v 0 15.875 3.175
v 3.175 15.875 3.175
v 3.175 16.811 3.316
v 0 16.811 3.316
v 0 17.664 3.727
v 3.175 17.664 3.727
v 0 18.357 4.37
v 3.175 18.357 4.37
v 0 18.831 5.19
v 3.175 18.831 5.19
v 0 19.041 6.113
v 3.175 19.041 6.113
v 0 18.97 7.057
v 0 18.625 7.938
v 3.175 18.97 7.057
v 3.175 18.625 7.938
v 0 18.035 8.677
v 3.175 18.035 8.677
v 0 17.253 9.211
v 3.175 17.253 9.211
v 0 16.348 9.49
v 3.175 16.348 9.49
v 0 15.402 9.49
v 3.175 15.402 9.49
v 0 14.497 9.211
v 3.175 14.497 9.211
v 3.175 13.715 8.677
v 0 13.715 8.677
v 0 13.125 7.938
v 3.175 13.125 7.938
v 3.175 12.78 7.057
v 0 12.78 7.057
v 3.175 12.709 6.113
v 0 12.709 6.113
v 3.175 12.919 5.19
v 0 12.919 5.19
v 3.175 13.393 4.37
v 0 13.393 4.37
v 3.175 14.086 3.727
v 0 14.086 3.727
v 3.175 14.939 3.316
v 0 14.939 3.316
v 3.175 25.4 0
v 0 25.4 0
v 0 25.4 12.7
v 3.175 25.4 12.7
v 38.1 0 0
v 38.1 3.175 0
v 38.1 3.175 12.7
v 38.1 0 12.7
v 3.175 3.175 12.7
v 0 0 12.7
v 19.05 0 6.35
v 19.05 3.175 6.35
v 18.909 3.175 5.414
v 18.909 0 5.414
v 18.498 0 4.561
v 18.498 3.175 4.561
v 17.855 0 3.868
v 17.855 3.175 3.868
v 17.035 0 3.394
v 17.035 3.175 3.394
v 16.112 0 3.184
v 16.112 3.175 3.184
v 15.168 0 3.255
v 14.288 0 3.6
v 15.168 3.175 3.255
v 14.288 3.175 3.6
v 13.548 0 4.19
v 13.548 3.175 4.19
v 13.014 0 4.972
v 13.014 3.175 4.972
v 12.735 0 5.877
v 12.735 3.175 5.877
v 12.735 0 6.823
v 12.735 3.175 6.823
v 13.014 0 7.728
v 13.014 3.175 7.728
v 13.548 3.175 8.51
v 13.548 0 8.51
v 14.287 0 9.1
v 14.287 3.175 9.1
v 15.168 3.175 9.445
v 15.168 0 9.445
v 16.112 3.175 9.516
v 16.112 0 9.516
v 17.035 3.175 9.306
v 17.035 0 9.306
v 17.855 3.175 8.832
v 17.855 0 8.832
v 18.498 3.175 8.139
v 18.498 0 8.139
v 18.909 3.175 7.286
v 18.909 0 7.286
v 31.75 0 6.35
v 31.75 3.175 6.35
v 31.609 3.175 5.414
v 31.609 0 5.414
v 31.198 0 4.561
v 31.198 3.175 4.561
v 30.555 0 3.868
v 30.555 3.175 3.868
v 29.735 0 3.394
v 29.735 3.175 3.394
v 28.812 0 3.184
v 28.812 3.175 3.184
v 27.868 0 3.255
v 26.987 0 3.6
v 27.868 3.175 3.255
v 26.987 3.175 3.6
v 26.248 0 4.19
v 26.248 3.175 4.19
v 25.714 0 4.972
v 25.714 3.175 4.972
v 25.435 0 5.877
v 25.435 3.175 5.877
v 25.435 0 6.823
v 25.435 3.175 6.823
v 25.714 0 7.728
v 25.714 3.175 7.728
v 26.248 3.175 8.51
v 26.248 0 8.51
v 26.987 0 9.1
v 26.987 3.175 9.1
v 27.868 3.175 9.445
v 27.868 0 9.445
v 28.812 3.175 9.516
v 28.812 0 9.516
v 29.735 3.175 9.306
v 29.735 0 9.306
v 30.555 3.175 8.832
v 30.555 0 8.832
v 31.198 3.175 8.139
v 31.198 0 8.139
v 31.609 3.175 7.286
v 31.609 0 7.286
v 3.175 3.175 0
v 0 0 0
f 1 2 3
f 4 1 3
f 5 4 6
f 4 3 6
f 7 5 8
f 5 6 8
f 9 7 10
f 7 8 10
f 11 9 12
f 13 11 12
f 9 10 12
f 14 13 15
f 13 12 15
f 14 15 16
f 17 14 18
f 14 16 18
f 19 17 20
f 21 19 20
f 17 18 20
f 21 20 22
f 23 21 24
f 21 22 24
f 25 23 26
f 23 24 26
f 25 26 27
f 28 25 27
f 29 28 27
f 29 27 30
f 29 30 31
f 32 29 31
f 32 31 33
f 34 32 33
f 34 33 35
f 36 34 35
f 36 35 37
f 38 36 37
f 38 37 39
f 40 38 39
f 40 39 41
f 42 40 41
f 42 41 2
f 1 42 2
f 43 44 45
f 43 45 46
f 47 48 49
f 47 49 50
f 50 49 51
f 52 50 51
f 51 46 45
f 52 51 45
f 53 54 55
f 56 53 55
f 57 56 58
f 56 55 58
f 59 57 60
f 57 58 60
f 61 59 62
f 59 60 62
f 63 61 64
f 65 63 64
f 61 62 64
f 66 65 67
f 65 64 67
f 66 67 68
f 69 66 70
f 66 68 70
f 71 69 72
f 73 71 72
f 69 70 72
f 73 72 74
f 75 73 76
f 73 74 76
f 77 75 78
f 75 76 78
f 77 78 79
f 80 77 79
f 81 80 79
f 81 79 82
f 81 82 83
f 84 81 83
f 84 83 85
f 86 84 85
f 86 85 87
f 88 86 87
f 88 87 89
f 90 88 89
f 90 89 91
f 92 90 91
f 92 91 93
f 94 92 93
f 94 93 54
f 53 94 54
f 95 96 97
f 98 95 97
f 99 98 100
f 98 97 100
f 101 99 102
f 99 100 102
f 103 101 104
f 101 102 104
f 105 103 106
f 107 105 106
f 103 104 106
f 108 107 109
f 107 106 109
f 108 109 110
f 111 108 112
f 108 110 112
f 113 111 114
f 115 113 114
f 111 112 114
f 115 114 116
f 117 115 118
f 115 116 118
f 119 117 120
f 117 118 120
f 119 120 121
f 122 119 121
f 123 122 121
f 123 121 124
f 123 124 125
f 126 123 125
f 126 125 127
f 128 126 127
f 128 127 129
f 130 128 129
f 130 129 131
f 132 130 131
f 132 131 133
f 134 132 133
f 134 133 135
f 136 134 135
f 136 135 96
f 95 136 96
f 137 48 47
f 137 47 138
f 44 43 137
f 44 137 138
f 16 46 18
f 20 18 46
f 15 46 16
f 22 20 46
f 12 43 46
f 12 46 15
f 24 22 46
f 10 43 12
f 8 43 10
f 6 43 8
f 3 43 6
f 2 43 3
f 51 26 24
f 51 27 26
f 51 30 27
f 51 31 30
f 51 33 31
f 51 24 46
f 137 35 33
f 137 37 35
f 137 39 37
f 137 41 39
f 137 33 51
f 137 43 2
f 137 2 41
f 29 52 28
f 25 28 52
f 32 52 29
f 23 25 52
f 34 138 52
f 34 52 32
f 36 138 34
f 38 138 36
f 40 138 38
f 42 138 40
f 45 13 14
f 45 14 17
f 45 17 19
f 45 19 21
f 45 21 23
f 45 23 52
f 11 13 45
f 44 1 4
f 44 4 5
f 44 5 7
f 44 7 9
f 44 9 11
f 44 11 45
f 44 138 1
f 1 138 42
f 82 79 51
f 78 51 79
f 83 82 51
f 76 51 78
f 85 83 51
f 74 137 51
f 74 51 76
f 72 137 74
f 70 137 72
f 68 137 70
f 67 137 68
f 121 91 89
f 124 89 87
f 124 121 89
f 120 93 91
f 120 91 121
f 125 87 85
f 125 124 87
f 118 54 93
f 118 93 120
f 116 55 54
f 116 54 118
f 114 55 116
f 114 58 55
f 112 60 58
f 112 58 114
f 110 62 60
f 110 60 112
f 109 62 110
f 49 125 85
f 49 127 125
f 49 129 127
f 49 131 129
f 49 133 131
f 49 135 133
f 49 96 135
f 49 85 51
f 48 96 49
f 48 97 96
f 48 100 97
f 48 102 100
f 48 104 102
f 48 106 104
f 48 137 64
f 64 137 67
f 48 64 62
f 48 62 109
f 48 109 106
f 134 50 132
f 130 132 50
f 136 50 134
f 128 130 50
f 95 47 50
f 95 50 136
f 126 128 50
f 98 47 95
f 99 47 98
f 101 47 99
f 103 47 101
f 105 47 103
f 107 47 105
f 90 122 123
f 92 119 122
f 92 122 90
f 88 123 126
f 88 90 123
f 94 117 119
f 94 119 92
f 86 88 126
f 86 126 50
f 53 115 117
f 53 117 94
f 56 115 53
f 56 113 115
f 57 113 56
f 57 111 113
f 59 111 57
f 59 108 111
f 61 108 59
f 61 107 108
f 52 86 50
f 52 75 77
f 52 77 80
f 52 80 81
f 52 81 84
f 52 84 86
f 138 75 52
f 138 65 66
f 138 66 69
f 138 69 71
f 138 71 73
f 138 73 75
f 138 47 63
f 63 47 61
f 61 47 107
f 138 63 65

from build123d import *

# Parameters (mm, degrees)
BOSS_EXTRUDE1_DEPTH = 12.7
SKETCH2_R           = 3.175
CUT_EXTRUDE1_DEPTH  = 4.175
SKETCH3_R           = 3.175
CUT_EXTRUDE2_DEPTH  = 4.175


with BuildPart() as part:
    # Sketch1 → Boss-Extrude1 (new body)
    with BuildSketch(Plane.XY):
        Polygon((0, 0), (0, 25.4), (3.175, 25.4), (3.175, 3.175), (38.1, 3.175), (38.1, 0), align=None)
    extrude(amount=BOSS_EXTRUDE1_DEPTH)

    # Sketch2 → Cut-Extrude1 (cut, through all)
    with BuildSketch(Plane(origin=(0, 3.175, 0), x_dir=(1, 0, 0), z_dir=(0, 1, 0))):
        with Locations((15.875, -6.35)):
            Circle(SKETCH2_R)
        with Locations((28.575, -6.35)):
            Circle(SKETCH2_R)
    extrude(amount=-CUT_EXTRUDE1_DEPTH, mode=Mode.SUBTRACT)

    # Sketch3 → Cut-Extrude2 (cut, through all)
    with BuildSketch(Plane(origin=(3.175, 0, 0), x_dir=(0, 0, -1), z_dir=(1, 0, 0))):
        with Locations((-6.35, 28.575)):
            Circle(SKETCH3_R)
        with Locations((-6.35, 15.875)):
            Circle(SKETCH3_R)
    extrude(amount=-CUT_EXTRUDE2_DEPTH, mode=Mode.SUBTRACT)


solid = part.part
